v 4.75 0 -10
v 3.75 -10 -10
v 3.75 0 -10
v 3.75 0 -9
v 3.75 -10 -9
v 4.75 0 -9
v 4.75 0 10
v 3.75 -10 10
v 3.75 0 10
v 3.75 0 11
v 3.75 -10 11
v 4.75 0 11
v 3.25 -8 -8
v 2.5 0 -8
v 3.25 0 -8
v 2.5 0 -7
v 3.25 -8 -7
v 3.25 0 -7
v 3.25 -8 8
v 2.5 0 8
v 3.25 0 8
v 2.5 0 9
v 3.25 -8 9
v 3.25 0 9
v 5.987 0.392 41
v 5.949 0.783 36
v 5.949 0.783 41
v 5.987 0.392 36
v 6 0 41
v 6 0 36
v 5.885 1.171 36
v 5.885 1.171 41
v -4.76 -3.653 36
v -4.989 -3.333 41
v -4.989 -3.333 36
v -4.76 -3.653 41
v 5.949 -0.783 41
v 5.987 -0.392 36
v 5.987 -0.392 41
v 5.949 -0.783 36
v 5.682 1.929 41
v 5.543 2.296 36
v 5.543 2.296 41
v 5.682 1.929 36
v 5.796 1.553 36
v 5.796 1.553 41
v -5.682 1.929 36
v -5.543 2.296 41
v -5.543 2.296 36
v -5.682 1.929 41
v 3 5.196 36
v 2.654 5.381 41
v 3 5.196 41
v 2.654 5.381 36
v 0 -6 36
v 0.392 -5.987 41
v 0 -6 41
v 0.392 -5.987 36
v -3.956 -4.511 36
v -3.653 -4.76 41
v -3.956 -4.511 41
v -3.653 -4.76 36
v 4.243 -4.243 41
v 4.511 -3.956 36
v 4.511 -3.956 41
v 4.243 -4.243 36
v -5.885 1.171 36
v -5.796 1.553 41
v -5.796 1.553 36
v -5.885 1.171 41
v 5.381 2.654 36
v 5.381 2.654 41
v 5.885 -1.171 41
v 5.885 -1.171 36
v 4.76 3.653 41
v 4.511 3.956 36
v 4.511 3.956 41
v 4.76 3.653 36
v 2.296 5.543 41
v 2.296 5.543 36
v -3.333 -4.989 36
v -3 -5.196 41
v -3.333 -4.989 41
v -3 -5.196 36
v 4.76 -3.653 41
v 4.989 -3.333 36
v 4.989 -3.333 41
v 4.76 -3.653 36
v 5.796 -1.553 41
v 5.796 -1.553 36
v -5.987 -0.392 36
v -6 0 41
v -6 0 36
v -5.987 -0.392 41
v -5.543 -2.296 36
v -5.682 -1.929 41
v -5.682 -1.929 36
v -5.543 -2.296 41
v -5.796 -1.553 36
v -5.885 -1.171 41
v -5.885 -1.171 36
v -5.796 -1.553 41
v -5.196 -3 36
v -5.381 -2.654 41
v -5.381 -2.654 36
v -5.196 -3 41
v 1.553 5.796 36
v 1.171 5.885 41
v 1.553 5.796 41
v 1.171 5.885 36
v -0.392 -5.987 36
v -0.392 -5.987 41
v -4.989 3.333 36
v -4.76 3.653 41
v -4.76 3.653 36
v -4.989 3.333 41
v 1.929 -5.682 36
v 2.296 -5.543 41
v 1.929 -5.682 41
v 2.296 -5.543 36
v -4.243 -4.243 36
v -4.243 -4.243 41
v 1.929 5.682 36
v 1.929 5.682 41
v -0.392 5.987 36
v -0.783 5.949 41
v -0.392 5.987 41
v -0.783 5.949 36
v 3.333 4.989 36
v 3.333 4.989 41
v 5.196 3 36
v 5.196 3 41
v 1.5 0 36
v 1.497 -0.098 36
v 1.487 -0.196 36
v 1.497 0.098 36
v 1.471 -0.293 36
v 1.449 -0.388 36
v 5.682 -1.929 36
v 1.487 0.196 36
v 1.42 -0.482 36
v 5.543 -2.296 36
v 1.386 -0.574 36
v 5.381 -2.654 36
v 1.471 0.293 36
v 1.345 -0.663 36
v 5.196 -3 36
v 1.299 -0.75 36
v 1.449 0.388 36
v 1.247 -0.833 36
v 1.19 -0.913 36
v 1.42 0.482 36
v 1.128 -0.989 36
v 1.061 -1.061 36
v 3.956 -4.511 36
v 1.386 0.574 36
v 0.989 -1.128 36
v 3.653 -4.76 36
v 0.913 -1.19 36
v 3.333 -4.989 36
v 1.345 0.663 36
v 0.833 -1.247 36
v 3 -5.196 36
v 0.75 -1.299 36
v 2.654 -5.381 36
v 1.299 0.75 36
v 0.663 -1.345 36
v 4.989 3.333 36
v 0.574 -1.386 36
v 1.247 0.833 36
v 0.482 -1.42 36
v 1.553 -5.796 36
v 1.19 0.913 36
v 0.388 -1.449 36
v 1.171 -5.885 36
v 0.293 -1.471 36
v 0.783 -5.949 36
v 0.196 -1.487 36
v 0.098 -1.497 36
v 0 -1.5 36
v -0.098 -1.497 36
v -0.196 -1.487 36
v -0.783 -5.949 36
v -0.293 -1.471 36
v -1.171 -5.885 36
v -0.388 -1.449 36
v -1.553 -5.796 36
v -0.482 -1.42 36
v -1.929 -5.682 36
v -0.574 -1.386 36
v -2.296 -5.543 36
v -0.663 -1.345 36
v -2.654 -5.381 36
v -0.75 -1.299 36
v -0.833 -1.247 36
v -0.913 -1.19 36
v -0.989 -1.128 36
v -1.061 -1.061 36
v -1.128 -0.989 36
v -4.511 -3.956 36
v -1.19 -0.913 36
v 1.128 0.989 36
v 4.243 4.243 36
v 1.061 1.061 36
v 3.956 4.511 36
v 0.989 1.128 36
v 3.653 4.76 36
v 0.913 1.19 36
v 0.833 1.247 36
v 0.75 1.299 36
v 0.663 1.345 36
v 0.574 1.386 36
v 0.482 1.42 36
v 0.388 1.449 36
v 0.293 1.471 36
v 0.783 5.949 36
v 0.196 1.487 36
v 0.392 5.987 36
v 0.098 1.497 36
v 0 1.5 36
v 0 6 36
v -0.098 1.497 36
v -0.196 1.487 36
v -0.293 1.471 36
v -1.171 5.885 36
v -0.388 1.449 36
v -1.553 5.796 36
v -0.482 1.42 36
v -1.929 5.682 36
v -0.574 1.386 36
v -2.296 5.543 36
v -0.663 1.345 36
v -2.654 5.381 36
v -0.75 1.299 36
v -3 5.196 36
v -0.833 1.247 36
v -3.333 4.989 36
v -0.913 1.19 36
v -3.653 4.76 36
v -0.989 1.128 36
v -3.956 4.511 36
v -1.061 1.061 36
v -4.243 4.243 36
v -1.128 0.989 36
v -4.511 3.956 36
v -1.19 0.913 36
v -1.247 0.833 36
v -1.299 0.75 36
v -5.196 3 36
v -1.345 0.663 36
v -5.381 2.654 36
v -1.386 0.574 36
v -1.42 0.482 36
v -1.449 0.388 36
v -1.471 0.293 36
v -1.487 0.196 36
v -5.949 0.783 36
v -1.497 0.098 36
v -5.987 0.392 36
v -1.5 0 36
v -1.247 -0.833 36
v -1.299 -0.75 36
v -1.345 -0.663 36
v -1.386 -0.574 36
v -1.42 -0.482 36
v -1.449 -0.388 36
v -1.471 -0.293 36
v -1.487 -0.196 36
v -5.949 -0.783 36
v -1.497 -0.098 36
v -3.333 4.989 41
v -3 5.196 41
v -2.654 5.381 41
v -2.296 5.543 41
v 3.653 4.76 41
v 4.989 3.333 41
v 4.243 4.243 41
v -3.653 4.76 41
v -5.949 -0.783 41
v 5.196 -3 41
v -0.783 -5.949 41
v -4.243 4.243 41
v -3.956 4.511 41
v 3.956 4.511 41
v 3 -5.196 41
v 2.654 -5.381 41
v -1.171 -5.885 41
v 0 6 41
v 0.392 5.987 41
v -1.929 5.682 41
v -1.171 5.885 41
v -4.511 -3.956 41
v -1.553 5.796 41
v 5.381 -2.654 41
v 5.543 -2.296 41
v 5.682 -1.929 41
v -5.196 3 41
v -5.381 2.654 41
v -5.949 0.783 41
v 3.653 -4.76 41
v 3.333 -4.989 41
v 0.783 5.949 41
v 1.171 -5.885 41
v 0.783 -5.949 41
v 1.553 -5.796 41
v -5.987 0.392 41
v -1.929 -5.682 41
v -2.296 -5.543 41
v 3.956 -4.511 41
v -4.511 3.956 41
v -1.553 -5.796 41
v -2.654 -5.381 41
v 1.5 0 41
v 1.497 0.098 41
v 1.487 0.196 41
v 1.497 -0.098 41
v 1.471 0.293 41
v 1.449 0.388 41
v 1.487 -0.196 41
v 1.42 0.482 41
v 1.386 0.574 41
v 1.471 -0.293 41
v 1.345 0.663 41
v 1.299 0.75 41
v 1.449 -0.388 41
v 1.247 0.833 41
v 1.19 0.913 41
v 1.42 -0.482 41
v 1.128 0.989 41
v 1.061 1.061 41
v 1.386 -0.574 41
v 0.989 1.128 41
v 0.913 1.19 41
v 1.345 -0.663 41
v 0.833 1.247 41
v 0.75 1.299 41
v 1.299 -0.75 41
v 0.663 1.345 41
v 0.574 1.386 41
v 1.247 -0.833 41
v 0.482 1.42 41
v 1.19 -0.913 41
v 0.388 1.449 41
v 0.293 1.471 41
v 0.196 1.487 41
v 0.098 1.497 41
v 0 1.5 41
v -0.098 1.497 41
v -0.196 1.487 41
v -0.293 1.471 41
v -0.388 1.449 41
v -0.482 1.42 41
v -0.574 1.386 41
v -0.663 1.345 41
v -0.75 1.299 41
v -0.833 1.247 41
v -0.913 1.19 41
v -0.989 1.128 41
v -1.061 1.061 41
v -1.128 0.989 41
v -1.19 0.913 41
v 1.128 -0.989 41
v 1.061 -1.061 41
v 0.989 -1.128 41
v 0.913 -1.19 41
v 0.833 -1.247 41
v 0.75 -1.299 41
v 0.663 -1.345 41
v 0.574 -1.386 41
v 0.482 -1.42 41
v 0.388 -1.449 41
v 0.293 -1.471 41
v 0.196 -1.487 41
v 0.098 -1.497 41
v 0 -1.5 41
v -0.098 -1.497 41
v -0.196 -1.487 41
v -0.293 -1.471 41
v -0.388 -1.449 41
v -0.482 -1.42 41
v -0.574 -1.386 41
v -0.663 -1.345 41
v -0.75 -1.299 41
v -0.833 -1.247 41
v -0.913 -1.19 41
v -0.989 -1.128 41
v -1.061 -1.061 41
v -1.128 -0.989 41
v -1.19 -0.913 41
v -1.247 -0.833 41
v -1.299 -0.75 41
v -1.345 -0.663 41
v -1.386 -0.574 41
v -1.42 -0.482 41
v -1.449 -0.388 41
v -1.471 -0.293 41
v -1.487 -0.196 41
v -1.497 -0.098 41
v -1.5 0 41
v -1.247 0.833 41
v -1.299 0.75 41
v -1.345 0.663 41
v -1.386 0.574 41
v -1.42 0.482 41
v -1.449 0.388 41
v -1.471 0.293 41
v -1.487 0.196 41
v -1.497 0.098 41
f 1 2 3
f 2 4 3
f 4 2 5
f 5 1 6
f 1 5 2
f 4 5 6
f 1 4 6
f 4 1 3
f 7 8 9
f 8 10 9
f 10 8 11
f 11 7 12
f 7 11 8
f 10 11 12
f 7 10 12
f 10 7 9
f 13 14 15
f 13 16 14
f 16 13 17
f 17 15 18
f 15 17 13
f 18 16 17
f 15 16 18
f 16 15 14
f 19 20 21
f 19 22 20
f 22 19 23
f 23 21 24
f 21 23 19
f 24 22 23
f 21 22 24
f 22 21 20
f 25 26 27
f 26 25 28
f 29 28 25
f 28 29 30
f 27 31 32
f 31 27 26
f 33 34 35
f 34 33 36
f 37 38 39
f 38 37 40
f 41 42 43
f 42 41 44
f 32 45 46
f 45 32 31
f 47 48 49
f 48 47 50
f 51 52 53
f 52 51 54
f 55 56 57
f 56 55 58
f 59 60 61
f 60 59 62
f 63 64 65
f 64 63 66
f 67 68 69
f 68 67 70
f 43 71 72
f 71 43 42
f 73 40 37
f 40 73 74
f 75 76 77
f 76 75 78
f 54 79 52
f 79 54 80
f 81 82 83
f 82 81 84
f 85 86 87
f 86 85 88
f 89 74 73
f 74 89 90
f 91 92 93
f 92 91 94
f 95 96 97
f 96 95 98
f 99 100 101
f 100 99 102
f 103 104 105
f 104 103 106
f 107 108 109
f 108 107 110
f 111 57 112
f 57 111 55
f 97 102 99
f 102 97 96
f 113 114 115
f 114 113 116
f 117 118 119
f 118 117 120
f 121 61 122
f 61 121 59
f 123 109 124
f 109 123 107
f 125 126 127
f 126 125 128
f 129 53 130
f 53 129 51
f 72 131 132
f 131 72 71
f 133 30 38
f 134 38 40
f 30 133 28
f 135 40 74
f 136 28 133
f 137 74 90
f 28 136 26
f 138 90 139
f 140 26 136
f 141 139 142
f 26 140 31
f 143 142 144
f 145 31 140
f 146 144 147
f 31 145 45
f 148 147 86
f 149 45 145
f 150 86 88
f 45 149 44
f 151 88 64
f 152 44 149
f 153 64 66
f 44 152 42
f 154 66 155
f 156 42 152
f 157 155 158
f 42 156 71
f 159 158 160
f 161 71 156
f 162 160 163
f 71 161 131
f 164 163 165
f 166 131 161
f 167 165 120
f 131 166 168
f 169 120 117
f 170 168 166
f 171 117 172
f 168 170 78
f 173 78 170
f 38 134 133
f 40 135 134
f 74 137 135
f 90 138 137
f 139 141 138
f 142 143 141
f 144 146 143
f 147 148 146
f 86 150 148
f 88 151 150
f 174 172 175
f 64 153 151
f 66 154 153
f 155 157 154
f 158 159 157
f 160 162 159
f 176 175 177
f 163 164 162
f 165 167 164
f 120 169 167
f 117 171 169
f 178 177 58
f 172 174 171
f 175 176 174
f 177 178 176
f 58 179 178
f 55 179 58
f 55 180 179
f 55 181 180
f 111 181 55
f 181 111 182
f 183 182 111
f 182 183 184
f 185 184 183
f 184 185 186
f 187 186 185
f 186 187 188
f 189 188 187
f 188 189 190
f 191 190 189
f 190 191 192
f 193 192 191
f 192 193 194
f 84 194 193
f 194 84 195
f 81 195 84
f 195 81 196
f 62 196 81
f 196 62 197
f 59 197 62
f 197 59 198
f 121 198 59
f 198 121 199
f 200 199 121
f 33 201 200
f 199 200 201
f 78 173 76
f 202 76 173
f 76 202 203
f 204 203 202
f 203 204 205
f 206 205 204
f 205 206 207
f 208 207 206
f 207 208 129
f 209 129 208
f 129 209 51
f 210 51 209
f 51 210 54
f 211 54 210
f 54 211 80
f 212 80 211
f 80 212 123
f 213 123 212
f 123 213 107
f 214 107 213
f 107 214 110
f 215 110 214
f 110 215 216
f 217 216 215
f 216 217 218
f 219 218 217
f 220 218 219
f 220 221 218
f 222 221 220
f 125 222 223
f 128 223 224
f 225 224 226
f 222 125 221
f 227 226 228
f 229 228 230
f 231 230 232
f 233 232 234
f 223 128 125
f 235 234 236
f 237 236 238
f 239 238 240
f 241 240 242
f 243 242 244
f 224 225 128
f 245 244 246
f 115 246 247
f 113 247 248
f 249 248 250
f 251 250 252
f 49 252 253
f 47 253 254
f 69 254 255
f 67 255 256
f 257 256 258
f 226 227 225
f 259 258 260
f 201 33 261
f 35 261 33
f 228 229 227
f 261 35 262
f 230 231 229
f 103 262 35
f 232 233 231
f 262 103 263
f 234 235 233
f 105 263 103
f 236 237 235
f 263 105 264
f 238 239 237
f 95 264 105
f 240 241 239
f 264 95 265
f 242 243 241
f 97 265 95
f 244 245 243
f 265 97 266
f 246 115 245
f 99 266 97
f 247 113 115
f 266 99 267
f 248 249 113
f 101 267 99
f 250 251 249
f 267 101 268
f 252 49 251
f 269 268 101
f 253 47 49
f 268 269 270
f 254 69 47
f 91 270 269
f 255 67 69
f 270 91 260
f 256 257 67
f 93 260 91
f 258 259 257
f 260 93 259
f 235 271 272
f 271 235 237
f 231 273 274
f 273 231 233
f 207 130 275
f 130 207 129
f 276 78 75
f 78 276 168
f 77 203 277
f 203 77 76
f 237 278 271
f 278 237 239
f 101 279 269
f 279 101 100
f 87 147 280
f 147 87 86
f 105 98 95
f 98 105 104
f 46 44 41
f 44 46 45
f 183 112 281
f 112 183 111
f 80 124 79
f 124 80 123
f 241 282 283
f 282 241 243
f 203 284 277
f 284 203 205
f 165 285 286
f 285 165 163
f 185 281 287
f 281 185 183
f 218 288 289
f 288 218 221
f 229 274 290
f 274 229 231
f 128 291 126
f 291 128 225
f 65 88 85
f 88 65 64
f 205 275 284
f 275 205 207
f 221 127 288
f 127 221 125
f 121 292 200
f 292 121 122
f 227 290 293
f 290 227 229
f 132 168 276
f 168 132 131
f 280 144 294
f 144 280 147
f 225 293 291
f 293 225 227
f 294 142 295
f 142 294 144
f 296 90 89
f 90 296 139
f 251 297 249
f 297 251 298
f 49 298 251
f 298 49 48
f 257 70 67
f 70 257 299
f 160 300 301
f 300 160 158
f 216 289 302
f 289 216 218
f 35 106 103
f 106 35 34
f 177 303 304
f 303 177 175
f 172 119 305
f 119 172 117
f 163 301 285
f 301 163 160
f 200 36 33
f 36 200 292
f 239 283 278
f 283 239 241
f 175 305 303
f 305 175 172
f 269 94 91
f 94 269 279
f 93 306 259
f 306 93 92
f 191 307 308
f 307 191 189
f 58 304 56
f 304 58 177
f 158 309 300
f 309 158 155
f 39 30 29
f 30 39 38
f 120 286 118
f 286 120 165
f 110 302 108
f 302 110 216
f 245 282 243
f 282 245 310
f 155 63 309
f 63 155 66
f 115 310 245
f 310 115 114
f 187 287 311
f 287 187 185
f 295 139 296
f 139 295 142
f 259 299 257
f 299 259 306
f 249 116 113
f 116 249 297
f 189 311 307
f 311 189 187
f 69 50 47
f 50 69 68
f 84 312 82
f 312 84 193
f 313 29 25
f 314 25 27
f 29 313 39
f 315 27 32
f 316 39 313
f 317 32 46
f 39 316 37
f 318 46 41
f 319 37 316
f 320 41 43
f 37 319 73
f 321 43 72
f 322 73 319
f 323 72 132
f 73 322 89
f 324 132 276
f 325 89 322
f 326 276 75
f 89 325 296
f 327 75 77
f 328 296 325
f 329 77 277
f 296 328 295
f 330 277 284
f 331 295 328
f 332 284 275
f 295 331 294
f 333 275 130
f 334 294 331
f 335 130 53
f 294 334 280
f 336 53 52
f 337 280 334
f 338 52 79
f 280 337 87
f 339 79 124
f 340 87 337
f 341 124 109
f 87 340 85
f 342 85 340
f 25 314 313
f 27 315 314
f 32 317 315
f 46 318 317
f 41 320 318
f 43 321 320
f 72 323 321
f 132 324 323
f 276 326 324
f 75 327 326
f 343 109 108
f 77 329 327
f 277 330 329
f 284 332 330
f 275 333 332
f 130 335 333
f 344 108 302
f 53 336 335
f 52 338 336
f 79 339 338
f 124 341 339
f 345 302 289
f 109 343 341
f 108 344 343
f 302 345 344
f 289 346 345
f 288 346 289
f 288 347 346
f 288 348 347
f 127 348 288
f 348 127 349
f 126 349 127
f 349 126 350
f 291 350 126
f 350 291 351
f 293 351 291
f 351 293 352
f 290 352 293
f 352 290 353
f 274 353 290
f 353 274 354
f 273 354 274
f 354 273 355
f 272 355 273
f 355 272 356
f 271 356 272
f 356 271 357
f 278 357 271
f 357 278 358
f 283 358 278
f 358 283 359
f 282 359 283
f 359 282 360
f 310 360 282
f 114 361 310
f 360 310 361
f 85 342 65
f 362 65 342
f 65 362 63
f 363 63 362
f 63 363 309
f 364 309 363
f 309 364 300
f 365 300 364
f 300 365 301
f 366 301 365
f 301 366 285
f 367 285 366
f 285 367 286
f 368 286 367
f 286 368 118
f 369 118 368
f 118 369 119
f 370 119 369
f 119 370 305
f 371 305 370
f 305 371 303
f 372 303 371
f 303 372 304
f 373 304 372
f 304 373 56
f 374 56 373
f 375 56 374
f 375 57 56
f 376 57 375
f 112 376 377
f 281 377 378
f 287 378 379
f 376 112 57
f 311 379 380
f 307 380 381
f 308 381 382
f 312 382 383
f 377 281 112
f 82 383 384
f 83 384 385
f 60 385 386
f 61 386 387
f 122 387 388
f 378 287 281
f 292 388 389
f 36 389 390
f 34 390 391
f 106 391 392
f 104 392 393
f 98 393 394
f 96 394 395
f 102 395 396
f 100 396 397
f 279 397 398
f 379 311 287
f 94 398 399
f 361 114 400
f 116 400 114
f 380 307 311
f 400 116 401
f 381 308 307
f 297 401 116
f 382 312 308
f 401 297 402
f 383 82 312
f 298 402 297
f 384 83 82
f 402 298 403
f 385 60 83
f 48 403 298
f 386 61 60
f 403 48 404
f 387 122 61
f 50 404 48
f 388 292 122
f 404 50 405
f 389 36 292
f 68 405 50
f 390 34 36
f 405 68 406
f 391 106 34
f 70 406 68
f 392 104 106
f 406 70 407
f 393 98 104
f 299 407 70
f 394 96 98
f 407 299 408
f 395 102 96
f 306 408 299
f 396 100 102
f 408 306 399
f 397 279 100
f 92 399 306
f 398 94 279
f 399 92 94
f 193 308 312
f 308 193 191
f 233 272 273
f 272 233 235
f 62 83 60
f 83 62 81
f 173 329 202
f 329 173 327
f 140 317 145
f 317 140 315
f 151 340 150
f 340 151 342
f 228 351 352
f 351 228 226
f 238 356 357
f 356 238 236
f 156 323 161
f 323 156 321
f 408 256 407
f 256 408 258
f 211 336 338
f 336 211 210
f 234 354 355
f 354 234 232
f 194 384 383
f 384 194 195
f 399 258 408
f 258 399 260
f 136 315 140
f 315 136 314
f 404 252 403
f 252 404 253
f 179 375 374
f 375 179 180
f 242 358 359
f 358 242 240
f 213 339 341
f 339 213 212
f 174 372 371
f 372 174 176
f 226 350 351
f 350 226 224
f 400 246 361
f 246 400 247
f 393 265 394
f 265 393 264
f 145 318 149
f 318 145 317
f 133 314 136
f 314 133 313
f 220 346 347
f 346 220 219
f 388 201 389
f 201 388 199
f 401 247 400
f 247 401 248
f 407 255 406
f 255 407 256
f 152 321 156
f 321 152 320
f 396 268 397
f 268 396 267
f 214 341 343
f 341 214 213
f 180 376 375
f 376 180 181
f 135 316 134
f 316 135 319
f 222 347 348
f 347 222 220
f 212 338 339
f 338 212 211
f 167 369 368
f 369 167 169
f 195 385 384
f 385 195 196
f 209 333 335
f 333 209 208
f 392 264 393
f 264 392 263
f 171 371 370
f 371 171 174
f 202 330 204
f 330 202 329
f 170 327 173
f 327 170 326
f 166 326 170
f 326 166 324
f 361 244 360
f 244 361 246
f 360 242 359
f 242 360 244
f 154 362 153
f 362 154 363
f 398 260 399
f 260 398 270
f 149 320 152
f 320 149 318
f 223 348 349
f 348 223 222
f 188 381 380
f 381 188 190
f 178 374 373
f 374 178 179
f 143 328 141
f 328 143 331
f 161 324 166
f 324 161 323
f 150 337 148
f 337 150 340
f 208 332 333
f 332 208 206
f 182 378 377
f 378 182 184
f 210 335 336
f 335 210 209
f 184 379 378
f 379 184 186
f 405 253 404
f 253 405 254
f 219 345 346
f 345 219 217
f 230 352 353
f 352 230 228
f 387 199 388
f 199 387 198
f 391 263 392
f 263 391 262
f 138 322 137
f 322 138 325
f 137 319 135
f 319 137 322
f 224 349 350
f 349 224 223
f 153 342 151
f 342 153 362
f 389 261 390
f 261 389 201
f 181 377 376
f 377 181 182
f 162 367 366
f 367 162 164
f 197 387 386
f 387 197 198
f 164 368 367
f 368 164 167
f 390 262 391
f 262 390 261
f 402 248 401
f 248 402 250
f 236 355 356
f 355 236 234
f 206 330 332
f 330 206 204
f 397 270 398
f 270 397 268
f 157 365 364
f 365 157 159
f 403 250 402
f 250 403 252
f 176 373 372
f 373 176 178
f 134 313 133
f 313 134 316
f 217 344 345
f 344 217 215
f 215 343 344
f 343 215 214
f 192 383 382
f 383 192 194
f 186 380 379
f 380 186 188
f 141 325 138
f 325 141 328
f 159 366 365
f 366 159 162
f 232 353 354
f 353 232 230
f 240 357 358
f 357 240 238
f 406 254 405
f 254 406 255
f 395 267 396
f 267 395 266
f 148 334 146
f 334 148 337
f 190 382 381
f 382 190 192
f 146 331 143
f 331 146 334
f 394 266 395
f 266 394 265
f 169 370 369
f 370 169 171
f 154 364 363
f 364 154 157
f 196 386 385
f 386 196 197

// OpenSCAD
// Hose-barb reducer: 8 mm ID -> 5 mm ID
// Print orientation: standing upright along +Z

$fn = 96;

// ---- Dimensions (mm) ----
tube_id_8     = 8;    // 8 mm tubing inner diameter
tube_id_5     = 5;    // 5 mm tubing inner diameter
bore          = 3;    // through-bore diameter
barb_h_8      = 10;   // 8 mm tubing barb height
barb_od_8_bot = 7.5;  // 8 mm barb outer diameter at bottom
barb_od_8_top = 9.5;  // 8 mm barb outer diameter at top
collar_h      = 5;    // collar height (z = 20 to 25)
collar_od     = 12;   // collar outer diameter
barb_h_5      = 8;    // 5 mm tubing barb height
barb_od_5_bot = 6.5;  // 5 mm barb outer diameter at bottom
barb_od_5_top = 5.0;  // 5 mm barb outer diameter at top
total_h       = 41;   // top of last 5 mm barb

eps = 0.5;            // cutter overshoot

// ---- Model ----
difference() {
    union() {
        // 8 mm barbs: sawtooth profile, stacked
        for (s = [-1, 1])
            translate([0, 0, s * barb_h_8])
                linear_extrude(height = 1)
                    polygon([
                        [barb_od_8_bot / 2, 0],
                        [barb_od_8_top / 2, 0],
                        [barb_od_8_bot / 2, -barb_h_8]
                    ]);

        // collar
        translate([0, 0, total_h - collar_h])
            cylinder(h = collar_h, d = collar_od);

        // 5 mm barbs: shrinking profile, stacked
        for (s = [-1, 1])
            translate([0, 0, s * barb_h_5])
                linear_extrude(height = 1)
                    polygon([
                        [barb_od_5_bot / 2, 0],
                        [barb_od_5_top / 2, 0],
                        [barb_od_5_bot / 2, -barb_h_5]
                    ]);
    }

    // through-bore
    translate([0, 0, -eps])
        cylinder(h = total_h + 2 * eps, d = bore);
}
